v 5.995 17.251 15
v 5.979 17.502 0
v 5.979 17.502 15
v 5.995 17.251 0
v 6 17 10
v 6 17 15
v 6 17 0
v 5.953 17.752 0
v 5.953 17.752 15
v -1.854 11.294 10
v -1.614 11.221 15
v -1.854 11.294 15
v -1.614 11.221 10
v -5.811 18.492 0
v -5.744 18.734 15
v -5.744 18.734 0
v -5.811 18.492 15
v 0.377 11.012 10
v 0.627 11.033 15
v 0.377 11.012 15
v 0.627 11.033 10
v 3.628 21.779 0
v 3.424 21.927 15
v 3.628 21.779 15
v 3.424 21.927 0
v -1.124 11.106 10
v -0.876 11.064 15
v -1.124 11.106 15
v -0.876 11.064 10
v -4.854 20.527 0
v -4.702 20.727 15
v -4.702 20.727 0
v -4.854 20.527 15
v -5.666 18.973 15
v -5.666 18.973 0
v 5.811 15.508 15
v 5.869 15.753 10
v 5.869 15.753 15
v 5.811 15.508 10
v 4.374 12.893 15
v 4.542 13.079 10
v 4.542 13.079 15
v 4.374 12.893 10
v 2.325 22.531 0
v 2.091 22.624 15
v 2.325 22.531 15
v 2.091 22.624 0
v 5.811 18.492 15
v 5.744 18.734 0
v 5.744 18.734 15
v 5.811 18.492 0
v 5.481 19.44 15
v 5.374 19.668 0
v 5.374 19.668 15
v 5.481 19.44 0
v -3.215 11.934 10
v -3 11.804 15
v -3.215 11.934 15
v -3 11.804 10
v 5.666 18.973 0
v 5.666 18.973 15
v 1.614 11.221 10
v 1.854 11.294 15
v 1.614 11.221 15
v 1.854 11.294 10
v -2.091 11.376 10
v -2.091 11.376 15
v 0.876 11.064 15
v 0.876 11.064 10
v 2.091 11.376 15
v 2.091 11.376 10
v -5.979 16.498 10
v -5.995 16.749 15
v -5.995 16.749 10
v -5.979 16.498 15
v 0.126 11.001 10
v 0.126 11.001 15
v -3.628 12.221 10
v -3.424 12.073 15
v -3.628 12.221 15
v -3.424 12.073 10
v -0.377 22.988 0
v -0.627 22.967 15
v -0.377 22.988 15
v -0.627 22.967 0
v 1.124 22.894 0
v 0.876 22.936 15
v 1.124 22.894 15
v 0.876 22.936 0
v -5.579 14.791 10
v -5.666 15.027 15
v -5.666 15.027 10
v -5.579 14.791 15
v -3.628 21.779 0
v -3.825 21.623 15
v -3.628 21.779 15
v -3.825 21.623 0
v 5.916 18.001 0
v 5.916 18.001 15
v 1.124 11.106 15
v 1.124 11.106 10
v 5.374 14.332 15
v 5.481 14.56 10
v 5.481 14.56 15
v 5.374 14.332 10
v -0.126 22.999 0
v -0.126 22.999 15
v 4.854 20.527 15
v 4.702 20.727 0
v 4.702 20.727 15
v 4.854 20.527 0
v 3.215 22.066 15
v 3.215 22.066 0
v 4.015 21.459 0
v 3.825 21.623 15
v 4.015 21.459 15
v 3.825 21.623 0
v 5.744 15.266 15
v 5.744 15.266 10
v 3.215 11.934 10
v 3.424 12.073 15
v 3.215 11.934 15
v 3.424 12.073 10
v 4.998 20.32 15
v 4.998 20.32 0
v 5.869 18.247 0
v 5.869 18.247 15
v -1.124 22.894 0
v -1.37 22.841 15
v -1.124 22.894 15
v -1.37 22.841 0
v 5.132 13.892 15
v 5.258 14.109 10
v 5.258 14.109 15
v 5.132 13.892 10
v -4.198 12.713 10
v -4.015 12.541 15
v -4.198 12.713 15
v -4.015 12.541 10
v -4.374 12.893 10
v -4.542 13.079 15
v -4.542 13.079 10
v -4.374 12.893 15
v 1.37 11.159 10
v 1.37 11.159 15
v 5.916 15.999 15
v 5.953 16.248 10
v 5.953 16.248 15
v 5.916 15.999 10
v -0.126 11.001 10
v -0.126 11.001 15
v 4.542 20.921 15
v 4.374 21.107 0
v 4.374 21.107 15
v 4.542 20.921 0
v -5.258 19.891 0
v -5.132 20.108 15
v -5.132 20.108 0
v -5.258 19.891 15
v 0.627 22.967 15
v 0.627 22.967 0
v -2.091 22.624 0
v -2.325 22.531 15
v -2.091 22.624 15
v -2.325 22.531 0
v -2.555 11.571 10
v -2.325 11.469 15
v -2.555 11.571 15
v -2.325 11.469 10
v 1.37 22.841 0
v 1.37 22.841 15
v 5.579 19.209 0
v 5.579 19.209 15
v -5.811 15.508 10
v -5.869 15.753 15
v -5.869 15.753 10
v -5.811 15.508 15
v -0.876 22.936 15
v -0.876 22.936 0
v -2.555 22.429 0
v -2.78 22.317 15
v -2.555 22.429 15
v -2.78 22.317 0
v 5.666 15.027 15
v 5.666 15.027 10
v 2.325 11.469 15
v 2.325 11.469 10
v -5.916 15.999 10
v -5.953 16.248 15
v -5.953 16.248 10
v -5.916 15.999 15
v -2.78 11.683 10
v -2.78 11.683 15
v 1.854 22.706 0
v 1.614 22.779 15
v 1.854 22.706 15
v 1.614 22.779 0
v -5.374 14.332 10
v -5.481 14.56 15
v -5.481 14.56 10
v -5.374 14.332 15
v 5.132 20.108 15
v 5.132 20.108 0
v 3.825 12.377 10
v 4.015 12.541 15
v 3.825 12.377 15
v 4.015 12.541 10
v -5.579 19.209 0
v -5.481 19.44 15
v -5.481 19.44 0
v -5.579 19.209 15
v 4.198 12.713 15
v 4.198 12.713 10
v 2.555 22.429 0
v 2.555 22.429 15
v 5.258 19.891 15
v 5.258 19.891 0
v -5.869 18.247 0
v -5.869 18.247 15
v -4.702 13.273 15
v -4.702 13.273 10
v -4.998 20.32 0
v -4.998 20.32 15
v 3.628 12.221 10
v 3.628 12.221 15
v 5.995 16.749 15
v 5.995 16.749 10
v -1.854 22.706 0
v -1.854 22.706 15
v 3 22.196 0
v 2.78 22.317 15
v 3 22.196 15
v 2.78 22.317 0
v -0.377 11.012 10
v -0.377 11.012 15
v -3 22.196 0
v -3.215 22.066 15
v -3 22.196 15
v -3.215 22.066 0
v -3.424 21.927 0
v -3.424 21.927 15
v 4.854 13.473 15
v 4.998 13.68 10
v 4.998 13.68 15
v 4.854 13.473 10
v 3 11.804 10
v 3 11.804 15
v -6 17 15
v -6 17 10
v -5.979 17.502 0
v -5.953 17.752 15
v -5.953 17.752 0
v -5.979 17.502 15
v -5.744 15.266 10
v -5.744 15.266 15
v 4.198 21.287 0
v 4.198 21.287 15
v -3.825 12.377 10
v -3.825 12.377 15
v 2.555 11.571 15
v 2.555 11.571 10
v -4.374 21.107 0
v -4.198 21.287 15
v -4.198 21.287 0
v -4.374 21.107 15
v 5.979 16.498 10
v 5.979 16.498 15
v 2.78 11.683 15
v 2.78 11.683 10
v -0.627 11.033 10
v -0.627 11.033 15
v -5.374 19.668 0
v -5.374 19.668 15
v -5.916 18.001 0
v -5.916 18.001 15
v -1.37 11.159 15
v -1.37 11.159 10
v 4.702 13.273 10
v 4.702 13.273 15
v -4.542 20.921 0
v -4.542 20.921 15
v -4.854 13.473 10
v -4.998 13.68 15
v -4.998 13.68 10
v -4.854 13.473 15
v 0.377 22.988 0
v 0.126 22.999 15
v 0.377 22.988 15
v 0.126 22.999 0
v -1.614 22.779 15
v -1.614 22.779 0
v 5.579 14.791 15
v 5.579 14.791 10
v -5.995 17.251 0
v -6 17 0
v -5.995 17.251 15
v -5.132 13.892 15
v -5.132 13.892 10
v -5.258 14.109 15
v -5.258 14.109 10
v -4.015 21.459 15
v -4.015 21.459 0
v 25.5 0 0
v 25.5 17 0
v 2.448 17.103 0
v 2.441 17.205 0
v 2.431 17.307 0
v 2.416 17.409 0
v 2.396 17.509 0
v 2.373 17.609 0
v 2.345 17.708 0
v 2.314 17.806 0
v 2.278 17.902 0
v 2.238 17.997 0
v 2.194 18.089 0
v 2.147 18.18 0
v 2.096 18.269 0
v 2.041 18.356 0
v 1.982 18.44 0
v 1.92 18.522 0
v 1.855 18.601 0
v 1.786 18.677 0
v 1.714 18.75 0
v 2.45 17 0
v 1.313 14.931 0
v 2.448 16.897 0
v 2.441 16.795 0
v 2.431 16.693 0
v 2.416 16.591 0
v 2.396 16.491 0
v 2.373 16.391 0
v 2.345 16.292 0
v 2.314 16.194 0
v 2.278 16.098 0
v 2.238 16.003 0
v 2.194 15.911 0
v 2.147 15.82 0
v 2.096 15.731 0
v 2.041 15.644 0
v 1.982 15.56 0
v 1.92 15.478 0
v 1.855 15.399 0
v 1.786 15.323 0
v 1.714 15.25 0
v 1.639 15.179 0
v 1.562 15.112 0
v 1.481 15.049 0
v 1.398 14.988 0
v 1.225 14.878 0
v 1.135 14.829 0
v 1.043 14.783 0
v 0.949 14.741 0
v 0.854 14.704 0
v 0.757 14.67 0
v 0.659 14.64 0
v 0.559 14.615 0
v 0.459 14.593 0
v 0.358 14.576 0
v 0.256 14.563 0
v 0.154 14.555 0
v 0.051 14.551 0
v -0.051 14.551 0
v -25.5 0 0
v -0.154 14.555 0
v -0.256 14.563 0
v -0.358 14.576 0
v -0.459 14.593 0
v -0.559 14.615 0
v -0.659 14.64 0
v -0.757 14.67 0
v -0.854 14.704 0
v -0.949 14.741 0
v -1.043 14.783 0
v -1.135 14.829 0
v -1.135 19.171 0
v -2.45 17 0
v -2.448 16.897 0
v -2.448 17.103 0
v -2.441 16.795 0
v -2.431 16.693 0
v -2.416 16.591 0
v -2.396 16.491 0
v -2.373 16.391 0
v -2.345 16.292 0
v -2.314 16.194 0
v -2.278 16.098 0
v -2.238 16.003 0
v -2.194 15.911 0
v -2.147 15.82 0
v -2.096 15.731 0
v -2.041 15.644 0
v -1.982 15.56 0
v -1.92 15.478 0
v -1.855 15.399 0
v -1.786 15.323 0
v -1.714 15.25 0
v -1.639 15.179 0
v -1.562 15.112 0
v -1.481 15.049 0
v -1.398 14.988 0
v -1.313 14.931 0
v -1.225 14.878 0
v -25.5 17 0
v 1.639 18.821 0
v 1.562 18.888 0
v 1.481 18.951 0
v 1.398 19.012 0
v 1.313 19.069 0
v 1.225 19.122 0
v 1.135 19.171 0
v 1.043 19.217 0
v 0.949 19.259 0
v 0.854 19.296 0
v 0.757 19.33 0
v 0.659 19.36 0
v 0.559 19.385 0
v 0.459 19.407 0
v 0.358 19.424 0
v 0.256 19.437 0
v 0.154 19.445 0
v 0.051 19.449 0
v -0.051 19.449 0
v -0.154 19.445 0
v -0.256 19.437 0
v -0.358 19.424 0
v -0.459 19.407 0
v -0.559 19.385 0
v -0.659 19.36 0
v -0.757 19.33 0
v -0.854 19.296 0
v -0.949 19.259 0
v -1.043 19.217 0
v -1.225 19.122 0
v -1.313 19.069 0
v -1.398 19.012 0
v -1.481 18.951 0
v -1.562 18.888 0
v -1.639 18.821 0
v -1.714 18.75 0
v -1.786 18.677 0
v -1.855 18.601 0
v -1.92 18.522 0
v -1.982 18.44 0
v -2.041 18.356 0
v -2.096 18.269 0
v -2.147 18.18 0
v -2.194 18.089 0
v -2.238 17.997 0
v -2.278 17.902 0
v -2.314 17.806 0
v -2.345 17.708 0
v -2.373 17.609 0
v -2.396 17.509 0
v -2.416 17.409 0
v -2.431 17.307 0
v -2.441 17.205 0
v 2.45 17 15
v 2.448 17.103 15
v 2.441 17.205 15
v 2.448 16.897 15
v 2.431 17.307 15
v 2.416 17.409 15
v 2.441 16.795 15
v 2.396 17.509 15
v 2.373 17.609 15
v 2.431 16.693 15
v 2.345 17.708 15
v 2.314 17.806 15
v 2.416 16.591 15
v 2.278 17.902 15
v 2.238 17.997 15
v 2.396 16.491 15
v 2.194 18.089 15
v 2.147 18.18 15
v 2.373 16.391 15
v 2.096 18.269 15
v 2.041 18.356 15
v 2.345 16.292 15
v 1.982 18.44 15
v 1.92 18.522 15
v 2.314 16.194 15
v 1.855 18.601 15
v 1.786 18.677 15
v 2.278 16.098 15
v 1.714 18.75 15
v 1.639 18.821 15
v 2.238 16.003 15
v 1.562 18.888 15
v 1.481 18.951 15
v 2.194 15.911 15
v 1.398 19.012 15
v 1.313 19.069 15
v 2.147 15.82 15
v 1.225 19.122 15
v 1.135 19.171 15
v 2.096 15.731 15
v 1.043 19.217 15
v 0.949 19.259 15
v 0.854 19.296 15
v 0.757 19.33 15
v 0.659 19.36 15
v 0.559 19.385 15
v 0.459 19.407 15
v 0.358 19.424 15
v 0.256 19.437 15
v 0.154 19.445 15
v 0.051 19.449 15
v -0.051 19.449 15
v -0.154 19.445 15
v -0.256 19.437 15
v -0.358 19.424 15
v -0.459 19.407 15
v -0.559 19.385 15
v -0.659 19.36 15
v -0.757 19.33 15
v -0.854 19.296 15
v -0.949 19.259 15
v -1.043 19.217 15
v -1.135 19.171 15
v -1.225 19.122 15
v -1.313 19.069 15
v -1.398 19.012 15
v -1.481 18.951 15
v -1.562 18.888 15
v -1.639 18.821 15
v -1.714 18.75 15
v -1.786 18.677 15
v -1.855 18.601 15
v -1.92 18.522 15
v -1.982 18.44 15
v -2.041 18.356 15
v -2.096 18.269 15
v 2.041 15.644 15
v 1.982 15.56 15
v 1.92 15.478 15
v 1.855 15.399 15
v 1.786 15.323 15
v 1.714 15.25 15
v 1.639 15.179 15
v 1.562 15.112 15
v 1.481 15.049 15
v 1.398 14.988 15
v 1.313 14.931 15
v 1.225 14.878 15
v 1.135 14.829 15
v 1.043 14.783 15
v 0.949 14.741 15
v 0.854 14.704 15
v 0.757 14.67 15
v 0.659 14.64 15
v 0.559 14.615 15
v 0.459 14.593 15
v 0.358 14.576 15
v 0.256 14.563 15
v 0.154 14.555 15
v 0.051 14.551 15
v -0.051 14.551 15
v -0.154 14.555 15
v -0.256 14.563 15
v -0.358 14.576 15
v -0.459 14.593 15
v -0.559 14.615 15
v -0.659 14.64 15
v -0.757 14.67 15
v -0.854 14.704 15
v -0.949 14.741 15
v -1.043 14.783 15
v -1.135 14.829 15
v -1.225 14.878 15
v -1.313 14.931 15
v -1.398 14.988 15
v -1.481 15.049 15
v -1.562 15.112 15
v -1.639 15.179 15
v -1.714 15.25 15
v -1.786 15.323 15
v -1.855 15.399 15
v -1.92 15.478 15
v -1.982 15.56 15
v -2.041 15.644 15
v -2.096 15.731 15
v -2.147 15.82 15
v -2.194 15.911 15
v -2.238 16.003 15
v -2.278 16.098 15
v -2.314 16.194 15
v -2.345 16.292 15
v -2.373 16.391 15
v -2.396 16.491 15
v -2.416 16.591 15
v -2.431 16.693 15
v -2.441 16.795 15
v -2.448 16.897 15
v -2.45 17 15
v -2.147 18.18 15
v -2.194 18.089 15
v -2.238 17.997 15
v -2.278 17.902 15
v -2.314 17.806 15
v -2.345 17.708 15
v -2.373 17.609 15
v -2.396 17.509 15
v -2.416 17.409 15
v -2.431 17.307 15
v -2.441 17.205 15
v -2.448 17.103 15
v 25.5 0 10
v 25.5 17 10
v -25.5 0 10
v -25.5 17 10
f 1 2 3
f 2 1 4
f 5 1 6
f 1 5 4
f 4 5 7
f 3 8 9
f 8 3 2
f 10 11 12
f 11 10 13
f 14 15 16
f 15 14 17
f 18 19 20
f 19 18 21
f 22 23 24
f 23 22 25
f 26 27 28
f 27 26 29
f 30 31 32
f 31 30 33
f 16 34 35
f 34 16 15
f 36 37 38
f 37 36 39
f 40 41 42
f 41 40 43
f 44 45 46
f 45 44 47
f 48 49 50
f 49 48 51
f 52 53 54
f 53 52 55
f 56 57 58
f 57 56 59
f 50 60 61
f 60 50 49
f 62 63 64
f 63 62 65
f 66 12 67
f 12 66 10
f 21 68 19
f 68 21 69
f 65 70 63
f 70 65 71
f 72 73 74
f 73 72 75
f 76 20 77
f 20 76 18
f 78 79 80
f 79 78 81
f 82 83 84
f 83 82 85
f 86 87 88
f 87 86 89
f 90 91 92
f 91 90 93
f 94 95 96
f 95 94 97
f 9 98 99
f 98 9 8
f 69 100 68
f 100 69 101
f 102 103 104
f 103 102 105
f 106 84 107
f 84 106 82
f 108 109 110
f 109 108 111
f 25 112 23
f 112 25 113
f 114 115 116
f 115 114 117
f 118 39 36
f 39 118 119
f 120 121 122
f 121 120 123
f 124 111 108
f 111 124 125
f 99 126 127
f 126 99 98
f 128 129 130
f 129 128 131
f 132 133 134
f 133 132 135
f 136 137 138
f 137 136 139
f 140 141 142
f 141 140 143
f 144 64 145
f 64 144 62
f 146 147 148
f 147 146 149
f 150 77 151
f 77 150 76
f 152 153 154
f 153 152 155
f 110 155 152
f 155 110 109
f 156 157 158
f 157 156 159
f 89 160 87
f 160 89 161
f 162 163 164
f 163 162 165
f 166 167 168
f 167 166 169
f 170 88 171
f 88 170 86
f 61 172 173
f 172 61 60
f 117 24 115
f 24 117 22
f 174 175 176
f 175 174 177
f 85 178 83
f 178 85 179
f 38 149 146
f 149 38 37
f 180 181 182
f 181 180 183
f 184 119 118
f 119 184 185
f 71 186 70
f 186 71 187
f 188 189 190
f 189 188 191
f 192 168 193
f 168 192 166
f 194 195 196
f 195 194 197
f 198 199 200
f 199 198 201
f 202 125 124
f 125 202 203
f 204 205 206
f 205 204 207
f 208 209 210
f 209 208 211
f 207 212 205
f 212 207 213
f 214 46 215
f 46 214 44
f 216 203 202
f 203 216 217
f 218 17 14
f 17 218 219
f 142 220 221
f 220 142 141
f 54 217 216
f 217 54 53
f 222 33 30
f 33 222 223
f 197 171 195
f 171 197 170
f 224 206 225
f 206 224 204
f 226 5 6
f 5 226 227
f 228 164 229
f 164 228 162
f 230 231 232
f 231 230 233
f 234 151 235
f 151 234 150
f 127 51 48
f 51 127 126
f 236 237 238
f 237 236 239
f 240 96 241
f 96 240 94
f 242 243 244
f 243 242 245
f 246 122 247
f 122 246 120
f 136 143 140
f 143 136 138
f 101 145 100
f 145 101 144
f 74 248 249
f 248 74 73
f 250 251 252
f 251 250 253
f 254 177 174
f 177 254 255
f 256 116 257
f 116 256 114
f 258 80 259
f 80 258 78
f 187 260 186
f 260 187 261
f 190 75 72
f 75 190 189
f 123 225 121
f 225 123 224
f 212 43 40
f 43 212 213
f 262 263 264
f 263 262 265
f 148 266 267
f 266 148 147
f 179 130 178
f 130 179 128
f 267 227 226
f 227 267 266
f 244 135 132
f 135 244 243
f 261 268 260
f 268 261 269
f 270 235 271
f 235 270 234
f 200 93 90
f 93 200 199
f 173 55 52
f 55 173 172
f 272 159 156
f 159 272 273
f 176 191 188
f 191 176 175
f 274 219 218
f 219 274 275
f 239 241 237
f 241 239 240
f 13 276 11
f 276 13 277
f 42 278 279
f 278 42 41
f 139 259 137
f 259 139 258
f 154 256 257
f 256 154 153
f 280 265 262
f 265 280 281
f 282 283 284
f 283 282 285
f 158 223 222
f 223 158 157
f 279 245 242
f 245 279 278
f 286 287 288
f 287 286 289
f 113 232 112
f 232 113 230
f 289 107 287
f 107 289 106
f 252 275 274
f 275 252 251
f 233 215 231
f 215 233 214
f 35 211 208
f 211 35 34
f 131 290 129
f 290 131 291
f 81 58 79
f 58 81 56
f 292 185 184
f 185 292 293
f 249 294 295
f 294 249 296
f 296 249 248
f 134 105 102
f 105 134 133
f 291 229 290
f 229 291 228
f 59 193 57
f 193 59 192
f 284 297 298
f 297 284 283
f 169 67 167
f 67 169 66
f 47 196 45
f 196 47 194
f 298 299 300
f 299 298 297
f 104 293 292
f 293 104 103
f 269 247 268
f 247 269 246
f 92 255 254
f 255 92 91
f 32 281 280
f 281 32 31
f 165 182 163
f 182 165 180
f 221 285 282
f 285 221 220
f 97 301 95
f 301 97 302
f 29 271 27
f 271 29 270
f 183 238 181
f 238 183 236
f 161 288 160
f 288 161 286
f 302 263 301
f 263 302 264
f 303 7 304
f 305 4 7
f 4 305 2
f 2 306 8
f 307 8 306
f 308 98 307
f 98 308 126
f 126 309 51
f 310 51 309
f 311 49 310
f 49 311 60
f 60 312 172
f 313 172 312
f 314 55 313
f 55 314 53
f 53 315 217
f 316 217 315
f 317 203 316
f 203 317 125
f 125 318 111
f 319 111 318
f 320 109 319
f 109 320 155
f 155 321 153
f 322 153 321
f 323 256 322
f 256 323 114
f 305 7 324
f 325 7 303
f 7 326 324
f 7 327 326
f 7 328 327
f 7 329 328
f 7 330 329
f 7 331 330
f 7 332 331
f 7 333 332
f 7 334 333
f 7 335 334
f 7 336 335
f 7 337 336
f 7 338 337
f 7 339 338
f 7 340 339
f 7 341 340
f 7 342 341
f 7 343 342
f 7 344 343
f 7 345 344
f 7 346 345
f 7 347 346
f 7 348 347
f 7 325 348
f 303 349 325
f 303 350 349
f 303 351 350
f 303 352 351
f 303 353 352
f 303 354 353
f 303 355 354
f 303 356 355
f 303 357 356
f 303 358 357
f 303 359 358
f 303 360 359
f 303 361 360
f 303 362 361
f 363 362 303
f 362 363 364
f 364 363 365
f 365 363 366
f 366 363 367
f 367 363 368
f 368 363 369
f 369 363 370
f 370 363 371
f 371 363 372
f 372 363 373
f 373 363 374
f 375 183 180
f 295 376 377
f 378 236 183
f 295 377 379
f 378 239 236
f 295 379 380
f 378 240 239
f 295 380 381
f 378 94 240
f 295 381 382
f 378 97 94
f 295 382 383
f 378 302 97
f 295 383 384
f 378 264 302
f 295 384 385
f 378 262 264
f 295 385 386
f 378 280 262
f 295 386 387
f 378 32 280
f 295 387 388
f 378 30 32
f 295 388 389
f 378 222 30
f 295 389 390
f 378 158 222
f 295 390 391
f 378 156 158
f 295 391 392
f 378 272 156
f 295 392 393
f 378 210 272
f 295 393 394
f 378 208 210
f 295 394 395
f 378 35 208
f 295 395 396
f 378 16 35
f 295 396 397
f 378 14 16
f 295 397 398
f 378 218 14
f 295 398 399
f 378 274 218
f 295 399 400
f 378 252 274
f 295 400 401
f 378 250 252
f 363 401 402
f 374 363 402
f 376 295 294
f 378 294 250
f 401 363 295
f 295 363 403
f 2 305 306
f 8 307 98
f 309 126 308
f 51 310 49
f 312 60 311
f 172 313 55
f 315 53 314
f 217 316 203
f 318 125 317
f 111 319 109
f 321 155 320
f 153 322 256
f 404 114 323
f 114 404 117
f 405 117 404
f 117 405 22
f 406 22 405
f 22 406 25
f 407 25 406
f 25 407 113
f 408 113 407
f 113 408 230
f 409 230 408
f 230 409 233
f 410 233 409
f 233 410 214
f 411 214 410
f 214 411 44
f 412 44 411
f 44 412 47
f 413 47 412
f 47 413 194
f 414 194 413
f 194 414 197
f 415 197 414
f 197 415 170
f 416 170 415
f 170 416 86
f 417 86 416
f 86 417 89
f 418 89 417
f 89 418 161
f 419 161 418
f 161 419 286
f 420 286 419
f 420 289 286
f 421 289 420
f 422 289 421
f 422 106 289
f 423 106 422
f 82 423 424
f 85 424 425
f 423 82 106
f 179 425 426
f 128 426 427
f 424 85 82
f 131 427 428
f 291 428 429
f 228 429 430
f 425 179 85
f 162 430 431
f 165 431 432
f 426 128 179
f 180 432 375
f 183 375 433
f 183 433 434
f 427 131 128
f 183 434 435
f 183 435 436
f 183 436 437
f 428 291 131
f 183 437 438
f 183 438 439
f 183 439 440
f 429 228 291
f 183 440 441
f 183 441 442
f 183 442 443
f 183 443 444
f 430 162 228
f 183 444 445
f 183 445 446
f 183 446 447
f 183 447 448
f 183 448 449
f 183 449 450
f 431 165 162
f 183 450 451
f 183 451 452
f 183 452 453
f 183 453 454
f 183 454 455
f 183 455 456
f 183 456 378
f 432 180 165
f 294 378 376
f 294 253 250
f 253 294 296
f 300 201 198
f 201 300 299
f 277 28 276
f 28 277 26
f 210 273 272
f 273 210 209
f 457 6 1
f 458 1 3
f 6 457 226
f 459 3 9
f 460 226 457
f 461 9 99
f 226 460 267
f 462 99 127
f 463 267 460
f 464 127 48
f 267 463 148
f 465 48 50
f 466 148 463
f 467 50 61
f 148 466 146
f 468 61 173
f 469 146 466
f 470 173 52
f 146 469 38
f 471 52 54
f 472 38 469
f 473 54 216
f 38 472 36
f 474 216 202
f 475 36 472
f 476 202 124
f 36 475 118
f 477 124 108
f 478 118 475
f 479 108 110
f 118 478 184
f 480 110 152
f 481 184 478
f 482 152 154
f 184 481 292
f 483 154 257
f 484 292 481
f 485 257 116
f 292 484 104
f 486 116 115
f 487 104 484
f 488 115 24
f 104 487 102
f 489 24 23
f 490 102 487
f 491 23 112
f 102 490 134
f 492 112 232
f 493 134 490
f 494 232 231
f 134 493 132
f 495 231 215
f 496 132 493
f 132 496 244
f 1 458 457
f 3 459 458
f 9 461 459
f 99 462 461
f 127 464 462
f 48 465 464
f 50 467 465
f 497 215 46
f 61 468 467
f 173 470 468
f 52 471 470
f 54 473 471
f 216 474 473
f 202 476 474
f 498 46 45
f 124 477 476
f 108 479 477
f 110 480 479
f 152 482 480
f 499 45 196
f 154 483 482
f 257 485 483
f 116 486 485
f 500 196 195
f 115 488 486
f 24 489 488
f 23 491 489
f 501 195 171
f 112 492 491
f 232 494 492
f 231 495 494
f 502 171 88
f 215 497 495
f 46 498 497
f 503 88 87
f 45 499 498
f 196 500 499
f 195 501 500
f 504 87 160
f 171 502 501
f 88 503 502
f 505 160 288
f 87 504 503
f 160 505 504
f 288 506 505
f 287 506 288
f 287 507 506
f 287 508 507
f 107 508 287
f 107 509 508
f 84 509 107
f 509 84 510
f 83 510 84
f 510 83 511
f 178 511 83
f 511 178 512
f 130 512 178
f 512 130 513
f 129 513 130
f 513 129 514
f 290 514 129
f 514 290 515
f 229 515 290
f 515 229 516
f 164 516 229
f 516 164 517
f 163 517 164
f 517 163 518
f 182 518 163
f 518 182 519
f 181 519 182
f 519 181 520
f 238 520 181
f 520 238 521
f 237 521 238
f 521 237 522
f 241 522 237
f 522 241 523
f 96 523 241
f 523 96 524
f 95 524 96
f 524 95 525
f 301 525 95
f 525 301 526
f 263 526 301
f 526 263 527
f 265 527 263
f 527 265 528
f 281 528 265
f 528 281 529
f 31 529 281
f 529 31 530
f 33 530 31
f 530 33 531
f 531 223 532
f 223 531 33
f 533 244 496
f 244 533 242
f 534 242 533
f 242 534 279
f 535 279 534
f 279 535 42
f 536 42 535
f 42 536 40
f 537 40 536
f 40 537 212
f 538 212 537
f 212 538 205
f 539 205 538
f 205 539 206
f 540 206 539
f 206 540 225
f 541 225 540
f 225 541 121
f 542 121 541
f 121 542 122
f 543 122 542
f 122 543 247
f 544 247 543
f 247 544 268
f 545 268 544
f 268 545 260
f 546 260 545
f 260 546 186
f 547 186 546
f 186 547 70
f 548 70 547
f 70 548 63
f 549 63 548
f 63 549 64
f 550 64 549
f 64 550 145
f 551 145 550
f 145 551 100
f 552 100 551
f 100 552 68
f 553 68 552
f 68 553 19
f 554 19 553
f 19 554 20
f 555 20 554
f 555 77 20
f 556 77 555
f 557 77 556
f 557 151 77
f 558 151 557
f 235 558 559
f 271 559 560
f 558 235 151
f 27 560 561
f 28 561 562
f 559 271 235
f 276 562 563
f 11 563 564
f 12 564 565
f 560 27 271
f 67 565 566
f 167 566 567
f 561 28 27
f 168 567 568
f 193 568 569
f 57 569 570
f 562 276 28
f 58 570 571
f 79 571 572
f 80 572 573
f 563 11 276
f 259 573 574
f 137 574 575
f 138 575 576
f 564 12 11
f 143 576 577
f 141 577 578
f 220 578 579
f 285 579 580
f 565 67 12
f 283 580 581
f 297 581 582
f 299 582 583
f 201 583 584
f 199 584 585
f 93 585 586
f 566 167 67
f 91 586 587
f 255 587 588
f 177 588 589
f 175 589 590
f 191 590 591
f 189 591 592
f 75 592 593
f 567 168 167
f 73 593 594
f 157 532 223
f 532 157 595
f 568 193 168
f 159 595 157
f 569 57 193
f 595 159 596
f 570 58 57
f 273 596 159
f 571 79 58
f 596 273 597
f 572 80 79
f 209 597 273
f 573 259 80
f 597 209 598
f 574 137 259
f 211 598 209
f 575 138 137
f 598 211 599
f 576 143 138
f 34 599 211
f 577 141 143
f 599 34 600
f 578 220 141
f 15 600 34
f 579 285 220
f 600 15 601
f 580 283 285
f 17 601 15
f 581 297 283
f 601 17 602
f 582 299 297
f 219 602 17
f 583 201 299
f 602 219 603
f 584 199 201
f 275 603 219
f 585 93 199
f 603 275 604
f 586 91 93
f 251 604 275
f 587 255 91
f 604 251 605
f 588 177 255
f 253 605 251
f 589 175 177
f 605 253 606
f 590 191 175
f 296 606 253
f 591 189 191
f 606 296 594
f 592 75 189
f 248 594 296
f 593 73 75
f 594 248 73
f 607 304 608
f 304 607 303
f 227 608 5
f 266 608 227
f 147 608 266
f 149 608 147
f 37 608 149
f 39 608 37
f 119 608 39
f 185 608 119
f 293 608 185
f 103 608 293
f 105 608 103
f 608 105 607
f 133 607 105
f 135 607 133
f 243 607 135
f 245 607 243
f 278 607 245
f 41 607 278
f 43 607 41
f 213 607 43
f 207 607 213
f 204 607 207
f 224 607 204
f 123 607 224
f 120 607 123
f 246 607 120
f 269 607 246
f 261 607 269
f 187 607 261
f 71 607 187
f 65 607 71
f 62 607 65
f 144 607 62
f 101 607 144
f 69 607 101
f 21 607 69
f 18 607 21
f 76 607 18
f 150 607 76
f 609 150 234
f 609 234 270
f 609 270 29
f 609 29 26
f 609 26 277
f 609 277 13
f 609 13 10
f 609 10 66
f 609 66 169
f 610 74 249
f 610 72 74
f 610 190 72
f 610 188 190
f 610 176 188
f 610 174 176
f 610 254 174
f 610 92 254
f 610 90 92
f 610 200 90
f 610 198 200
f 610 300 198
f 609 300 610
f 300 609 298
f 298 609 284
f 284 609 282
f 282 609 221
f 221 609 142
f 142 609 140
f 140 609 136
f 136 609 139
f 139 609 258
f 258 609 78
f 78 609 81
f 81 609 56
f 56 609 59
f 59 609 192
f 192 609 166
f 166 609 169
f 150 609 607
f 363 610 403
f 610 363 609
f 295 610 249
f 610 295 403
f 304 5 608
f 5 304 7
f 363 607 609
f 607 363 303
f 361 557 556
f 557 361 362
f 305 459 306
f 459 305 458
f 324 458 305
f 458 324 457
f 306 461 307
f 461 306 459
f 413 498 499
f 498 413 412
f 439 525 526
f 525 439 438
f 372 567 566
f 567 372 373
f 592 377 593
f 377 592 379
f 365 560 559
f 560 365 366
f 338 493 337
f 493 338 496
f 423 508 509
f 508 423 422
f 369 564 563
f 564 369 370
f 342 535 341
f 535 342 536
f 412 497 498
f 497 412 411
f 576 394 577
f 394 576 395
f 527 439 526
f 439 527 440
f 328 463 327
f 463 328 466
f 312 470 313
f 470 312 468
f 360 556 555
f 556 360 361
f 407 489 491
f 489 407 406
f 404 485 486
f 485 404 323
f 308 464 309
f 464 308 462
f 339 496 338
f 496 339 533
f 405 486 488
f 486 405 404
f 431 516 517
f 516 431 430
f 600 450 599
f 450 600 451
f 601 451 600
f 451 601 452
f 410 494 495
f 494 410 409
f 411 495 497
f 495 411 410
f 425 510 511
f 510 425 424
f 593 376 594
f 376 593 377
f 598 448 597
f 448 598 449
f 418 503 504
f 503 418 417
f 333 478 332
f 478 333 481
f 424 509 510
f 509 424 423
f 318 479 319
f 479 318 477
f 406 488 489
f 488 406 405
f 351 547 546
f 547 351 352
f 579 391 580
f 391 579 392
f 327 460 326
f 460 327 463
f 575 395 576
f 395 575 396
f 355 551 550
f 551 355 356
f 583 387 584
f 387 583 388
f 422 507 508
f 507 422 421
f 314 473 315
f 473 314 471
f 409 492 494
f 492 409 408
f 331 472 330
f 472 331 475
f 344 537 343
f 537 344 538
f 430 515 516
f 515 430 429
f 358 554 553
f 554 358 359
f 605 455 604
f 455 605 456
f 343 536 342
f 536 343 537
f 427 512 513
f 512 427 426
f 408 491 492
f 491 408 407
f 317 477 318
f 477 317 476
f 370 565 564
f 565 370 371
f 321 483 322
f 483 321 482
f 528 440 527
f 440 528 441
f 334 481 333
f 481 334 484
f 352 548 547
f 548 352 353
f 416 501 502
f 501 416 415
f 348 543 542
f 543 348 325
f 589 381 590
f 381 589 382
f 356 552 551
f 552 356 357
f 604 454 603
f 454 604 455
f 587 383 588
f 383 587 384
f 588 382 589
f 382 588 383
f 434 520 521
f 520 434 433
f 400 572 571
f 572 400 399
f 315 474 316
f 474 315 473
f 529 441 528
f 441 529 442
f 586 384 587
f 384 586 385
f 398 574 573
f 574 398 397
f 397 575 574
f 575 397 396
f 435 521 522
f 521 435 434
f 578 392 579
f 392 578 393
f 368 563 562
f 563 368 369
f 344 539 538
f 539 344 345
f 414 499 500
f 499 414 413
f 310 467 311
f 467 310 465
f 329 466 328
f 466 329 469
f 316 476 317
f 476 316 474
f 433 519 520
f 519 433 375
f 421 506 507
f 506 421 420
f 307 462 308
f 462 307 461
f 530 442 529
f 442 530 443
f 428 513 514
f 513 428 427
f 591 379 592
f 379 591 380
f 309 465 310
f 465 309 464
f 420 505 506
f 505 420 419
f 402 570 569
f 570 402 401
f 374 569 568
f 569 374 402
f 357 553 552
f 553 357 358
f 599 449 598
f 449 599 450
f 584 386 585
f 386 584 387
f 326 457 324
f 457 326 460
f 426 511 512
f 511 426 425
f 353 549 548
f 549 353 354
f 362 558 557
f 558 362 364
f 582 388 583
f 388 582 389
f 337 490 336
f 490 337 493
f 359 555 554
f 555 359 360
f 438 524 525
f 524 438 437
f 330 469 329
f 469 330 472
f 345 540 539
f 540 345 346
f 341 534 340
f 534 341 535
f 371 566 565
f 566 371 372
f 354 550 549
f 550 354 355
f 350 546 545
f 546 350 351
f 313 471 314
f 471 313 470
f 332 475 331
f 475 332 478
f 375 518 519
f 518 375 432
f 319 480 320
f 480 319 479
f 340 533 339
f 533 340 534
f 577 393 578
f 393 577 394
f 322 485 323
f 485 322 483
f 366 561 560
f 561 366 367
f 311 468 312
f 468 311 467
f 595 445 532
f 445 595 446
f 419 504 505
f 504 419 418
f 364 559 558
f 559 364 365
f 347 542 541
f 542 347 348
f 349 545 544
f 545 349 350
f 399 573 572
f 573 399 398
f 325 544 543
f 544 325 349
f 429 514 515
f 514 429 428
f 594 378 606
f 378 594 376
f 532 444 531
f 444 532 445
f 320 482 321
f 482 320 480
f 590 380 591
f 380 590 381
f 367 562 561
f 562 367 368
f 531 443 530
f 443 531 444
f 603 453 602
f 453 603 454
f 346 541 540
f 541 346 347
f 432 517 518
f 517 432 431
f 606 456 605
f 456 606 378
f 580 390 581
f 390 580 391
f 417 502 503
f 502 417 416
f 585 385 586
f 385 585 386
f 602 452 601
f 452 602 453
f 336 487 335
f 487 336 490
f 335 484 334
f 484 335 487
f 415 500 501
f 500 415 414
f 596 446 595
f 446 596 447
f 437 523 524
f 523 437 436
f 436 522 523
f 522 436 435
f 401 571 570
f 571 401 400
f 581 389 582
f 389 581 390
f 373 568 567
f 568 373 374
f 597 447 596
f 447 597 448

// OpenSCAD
// file: ../SCAD/constant.scad
max_width = 550;

smoothRodDiameter = 8.6;

ZAxis_rod_distance = 17;

ZAxis_top_first_hole = 10;
ZAxis_top_first_hole_offset = 5;
ZAxis_top_hole_spacing = 20;

ZAxis_top_hole_rod_offset = 25;
ZAxis_top_hole_rod_R1 = 4.05;
ZAxis_top_hole_rod_R2 = smoothRodDiameter/2;


channelDepth = 51;
channelWidth = 25.6;
channelThickness = 3.4;


DrillBitDameter = 1/8*25.54;

echo("constant");
echo("max width: ", max_width);
echo("right over size: ", 11);
echo("left over size: ", 11+44);
echo("max frame width: ", max_width-11-11-44); 
// main file
include <../SCAD/constant.scad>
height = 10;

$fn=150;

difference() {
    union() {
        translate([0,ZAxis_rod_distance,0])
        cylinder(h=height+5, d=12);
        
        translate([-channelDepth/2,0,0])
        cube([channelDepth,ZAxis_rod_distance,height]);
    }
    translate([0,ZAxis_rod_distance,0])
    cylinder(h=height+5, d=4.9);    
}
